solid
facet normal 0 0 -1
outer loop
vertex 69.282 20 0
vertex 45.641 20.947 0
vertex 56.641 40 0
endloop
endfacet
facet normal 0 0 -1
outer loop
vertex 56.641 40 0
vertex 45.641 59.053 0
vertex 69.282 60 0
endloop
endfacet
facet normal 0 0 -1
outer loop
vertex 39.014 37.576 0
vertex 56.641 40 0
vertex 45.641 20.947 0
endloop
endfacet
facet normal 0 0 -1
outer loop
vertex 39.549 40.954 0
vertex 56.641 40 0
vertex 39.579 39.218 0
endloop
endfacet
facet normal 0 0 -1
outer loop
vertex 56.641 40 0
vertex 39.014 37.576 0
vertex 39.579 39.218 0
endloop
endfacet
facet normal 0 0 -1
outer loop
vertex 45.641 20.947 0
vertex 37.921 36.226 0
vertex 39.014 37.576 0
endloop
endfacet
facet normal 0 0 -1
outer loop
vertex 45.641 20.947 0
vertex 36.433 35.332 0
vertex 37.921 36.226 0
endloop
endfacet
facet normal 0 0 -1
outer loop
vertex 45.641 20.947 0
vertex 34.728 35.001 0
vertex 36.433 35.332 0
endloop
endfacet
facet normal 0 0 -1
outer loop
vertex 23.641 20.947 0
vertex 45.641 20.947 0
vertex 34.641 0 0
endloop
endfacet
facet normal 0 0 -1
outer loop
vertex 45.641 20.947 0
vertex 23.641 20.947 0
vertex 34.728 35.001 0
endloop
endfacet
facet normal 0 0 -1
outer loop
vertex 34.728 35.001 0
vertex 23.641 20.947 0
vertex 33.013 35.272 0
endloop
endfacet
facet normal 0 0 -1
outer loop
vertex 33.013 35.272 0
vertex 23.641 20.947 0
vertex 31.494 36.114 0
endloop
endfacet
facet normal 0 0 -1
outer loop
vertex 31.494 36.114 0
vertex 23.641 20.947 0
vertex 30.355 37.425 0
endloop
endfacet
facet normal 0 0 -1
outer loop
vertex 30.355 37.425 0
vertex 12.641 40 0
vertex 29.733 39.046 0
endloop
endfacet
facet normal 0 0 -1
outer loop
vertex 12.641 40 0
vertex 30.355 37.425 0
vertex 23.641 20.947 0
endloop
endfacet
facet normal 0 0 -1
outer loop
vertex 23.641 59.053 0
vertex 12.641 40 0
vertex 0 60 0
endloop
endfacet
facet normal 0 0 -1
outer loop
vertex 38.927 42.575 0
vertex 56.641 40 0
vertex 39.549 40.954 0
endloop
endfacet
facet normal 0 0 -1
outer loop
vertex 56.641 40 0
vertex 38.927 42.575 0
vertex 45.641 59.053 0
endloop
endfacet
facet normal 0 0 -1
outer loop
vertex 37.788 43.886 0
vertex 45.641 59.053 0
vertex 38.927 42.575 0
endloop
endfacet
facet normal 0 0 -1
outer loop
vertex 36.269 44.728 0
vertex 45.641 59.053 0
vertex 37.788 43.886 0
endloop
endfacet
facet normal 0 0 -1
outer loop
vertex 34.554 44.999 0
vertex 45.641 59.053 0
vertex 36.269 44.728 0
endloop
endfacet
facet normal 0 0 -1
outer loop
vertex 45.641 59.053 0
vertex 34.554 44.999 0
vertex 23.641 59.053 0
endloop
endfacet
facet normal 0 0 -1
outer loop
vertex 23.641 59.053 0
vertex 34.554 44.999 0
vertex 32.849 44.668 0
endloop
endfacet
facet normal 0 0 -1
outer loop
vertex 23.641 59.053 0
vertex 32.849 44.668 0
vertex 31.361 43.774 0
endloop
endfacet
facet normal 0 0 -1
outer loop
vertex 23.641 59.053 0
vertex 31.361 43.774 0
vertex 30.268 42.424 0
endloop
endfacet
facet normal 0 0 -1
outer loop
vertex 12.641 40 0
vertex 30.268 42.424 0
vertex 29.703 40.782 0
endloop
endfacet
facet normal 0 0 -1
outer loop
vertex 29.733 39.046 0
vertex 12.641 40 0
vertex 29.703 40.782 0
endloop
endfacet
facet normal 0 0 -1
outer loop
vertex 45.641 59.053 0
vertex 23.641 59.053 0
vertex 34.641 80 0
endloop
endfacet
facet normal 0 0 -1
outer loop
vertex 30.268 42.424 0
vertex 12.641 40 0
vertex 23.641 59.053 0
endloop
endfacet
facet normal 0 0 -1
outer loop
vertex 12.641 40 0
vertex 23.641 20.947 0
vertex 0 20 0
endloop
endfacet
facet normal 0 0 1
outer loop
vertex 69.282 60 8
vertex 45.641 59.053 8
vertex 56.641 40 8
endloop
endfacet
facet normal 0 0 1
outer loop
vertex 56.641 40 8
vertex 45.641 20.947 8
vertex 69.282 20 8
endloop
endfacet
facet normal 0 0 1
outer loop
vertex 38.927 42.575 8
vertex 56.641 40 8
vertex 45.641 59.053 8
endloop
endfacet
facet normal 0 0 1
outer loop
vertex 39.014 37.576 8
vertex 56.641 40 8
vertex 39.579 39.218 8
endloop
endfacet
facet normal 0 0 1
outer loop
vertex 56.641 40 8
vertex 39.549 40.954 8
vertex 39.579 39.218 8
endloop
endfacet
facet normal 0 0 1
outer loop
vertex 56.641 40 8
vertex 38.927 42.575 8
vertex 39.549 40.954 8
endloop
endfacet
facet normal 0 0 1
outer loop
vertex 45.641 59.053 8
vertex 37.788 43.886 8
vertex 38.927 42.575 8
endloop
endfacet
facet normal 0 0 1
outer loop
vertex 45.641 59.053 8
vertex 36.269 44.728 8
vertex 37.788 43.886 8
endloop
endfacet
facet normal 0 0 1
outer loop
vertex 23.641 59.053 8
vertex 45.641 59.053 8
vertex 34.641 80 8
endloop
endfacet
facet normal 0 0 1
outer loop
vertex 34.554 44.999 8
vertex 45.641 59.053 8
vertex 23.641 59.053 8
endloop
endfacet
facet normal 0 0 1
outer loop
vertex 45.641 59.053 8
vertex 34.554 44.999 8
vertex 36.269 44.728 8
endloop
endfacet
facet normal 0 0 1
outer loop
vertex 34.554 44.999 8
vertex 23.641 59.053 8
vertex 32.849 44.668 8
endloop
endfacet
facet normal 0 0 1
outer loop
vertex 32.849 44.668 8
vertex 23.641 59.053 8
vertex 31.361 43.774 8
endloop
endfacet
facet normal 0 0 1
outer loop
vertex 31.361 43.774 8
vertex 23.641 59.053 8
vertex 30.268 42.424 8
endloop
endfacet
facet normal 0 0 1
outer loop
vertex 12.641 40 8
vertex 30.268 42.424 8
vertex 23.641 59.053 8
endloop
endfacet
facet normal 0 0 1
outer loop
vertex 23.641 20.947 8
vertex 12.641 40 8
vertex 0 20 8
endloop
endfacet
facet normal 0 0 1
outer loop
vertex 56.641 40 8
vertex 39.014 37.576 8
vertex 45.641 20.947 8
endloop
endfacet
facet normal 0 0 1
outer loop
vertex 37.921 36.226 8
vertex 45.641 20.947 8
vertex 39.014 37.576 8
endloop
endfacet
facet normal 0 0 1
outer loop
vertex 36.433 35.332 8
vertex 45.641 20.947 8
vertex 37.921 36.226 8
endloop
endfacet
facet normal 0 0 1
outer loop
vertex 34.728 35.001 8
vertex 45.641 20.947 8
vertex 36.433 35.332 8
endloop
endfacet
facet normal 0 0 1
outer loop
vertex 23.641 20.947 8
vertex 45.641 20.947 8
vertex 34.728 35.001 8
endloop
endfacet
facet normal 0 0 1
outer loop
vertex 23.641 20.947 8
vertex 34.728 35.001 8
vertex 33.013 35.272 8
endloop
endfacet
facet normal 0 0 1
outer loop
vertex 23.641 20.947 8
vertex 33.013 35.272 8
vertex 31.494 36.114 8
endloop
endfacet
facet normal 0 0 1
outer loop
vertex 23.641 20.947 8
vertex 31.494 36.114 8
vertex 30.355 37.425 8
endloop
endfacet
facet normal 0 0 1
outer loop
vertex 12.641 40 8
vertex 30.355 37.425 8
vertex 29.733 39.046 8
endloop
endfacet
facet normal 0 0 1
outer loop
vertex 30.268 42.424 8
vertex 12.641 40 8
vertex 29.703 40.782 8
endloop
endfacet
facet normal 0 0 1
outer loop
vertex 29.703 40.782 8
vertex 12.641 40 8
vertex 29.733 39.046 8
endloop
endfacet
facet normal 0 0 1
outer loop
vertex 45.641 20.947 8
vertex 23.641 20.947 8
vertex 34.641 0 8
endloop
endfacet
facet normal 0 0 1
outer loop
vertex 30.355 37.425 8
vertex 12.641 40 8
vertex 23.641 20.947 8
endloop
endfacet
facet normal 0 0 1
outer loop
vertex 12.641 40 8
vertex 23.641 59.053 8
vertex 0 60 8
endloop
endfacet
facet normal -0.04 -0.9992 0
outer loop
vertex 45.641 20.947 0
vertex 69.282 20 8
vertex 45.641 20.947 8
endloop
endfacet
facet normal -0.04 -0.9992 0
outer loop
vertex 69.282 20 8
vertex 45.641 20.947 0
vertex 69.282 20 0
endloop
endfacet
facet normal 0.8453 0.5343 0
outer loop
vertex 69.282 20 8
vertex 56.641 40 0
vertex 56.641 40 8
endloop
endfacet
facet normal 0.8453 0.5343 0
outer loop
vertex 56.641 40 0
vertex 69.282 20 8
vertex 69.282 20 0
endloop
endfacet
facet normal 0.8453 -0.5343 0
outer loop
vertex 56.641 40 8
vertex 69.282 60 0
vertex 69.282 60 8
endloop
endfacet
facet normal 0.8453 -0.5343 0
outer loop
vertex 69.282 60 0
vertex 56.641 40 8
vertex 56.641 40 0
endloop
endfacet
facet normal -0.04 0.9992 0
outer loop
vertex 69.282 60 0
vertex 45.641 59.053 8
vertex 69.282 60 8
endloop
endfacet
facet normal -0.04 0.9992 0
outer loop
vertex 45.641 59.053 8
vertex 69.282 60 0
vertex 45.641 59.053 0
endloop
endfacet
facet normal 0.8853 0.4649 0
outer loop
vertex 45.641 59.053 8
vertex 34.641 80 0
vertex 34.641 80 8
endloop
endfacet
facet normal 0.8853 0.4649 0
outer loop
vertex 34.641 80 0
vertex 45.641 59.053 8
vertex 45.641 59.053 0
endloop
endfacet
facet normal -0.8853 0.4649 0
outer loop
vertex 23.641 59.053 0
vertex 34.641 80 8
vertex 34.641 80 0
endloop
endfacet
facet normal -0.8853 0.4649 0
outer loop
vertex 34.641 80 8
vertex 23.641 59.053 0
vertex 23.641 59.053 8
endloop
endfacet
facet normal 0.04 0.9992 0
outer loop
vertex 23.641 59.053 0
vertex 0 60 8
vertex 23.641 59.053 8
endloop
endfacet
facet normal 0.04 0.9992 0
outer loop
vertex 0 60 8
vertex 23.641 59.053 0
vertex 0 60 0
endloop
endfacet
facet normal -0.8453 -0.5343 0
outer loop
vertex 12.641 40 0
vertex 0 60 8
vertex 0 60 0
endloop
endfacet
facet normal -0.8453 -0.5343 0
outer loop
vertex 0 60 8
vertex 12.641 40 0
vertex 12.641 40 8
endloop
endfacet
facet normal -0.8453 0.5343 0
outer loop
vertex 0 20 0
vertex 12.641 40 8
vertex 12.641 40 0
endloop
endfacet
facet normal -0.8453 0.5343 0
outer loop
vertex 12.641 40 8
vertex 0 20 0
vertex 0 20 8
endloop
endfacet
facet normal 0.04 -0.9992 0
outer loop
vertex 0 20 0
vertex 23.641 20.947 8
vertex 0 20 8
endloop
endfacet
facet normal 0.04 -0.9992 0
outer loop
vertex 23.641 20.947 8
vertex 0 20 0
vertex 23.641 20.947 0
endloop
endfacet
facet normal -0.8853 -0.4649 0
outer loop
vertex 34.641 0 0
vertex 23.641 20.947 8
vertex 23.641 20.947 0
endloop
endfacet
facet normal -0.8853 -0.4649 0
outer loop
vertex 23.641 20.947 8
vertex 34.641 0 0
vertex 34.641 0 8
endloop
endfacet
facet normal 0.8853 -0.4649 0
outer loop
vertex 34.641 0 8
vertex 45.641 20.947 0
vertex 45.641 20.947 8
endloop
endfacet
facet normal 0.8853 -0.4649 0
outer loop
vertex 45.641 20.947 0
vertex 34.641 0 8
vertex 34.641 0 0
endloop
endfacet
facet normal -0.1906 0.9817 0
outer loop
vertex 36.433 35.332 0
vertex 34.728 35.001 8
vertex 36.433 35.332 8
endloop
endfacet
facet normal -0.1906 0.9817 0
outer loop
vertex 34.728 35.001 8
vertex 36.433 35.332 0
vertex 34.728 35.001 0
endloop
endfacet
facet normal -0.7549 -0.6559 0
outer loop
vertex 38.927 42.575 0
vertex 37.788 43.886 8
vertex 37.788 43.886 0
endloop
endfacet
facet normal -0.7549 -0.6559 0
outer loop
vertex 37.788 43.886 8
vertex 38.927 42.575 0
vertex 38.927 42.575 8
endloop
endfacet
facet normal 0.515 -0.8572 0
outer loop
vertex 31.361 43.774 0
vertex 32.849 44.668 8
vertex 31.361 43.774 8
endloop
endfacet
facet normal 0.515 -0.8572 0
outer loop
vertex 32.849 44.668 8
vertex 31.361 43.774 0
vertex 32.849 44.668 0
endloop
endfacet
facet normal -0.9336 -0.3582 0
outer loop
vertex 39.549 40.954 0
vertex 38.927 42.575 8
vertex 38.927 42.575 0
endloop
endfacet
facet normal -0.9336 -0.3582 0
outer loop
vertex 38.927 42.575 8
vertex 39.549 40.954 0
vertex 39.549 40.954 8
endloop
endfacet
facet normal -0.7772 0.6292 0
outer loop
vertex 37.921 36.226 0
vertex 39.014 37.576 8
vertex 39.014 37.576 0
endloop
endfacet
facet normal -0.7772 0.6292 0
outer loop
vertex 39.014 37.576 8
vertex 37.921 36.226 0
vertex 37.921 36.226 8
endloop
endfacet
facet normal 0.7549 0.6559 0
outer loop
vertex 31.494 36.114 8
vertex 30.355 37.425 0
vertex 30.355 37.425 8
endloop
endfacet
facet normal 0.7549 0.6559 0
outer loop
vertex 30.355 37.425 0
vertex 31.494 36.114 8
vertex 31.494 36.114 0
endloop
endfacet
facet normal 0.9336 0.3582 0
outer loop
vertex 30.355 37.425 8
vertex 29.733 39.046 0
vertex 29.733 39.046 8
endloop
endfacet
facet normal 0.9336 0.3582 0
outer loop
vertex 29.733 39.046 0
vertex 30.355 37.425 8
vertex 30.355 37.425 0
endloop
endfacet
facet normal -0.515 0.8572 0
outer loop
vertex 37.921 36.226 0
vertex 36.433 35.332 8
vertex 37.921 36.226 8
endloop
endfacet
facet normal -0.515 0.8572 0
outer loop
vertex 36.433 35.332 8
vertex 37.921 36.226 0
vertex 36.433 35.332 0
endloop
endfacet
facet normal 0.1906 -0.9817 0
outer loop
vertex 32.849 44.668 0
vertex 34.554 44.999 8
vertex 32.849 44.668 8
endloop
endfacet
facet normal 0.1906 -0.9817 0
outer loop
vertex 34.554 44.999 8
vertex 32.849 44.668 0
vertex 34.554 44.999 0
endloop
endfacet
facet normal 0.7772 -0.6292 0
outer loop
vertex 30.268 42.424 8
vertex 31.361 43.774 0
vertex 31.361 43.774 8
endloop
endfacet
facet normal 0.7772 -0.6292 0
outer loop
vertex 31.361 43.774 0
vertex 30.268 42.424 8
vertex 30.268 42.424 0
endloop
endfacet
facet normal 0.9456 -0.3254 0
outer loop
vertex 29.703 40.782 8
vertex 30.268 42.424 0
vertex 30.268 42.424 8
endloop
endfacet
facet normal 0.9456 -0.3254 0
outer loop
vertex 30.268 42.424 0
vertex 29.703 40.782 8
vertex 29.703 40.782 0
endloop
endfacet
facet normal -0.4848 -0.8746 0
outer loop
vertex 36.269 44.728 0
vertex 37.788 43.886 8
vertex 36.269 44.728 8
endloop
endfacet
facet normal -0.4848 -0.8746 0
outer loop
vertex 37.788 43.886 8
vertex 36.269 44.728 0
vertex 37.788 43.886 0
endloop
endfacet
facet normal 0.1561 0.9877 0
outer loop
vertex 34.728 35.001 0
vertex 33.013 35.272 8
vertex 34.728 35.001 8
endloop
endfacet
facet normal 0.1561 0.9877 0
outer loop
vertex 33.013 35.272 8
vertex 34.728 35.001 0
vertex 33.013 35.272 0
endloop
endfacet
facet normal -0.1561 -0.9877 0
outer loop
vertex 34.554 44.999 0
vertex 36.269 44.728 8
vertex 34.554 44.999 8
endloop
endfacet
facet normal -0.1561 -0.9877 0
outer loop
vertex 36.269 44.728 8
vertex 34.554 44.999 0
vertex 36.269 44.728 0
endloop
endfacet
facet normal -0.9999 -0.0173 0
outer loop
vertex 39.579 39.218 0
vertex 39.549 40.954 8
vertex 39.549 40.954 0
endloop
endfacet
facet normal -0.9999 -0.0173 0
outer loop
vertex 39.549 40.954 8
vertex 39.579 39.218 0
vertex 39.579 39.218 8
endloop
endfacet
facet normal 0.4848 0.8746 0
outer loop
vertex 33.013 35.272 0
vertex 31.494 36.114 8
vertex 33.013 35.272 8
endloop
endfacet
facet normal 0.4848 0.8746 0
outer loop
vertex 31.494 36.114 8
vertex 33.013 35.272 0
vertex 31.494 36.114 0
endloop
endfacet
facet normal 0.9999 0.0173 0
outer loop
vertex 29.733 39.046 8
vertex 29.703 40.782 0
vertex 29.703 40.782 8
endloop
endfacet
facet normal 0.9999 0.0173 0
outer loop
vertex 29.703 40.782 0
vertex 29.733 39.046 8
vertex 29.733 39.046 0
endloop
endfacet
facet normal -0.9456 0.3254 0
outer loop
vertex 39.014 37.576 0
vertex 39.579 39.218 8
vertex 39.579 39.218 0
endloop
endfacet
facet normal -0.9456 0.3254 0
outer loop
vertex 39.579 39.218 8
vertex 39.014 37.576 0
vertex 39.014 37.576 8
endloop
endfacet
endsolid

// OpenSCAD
$fn = 32;

// ----------------------------------------------------------------------
// Star wheel: 6-point star, R40
// ----------------------------------------------------------------------

// --- parameters (mm) ---
n_points = 6;             // number of points / teeth
r_out = 40;               // tip radius
r_in = 22;                // root radius
bore_r = 5;               // centre bore radius
plate_t = 8;              // plate thickness, Z (extrusion height)
bore_d = 10;              // centre bore diameter

profile = [[34.641, 80], [23.641, 59.053], [0, 60], [12.641, 40], [0, 20], [23.641, 20.947], [34.641, 0], [45.641, 20.947], [69.282, 20], [56.641, 40], [69.282, 60], [45.641, 59.053]];  // primary outline, 12 points, counter clockwise
void_1 = [[39.549, 40.954], [38.927, 42.575], [37.788, 43.886], [36.269, 44.728], [34.554, 44.999], [32.849, 44.668], [31.361, 43.774], [30.268, 42.424], [29.703, 40.782], [29.733, 39.046], [30.355, 37.425], [31.494, 36.114], [33.013, 35.272], [34.728, 35.001], [36.433, 35.332], [37.921, 36.226], [39.014, 37.576], [39.579, 39.218]];  // centre bore, 18 points

// --- the one profile operation ---
difference() {
  linear_extrude(height = plate_t) polygon(points = profile);
  translate([0, 0, -1])
    linear_extrude(height = plate_t + 2) polygon(points = void_1);
}
